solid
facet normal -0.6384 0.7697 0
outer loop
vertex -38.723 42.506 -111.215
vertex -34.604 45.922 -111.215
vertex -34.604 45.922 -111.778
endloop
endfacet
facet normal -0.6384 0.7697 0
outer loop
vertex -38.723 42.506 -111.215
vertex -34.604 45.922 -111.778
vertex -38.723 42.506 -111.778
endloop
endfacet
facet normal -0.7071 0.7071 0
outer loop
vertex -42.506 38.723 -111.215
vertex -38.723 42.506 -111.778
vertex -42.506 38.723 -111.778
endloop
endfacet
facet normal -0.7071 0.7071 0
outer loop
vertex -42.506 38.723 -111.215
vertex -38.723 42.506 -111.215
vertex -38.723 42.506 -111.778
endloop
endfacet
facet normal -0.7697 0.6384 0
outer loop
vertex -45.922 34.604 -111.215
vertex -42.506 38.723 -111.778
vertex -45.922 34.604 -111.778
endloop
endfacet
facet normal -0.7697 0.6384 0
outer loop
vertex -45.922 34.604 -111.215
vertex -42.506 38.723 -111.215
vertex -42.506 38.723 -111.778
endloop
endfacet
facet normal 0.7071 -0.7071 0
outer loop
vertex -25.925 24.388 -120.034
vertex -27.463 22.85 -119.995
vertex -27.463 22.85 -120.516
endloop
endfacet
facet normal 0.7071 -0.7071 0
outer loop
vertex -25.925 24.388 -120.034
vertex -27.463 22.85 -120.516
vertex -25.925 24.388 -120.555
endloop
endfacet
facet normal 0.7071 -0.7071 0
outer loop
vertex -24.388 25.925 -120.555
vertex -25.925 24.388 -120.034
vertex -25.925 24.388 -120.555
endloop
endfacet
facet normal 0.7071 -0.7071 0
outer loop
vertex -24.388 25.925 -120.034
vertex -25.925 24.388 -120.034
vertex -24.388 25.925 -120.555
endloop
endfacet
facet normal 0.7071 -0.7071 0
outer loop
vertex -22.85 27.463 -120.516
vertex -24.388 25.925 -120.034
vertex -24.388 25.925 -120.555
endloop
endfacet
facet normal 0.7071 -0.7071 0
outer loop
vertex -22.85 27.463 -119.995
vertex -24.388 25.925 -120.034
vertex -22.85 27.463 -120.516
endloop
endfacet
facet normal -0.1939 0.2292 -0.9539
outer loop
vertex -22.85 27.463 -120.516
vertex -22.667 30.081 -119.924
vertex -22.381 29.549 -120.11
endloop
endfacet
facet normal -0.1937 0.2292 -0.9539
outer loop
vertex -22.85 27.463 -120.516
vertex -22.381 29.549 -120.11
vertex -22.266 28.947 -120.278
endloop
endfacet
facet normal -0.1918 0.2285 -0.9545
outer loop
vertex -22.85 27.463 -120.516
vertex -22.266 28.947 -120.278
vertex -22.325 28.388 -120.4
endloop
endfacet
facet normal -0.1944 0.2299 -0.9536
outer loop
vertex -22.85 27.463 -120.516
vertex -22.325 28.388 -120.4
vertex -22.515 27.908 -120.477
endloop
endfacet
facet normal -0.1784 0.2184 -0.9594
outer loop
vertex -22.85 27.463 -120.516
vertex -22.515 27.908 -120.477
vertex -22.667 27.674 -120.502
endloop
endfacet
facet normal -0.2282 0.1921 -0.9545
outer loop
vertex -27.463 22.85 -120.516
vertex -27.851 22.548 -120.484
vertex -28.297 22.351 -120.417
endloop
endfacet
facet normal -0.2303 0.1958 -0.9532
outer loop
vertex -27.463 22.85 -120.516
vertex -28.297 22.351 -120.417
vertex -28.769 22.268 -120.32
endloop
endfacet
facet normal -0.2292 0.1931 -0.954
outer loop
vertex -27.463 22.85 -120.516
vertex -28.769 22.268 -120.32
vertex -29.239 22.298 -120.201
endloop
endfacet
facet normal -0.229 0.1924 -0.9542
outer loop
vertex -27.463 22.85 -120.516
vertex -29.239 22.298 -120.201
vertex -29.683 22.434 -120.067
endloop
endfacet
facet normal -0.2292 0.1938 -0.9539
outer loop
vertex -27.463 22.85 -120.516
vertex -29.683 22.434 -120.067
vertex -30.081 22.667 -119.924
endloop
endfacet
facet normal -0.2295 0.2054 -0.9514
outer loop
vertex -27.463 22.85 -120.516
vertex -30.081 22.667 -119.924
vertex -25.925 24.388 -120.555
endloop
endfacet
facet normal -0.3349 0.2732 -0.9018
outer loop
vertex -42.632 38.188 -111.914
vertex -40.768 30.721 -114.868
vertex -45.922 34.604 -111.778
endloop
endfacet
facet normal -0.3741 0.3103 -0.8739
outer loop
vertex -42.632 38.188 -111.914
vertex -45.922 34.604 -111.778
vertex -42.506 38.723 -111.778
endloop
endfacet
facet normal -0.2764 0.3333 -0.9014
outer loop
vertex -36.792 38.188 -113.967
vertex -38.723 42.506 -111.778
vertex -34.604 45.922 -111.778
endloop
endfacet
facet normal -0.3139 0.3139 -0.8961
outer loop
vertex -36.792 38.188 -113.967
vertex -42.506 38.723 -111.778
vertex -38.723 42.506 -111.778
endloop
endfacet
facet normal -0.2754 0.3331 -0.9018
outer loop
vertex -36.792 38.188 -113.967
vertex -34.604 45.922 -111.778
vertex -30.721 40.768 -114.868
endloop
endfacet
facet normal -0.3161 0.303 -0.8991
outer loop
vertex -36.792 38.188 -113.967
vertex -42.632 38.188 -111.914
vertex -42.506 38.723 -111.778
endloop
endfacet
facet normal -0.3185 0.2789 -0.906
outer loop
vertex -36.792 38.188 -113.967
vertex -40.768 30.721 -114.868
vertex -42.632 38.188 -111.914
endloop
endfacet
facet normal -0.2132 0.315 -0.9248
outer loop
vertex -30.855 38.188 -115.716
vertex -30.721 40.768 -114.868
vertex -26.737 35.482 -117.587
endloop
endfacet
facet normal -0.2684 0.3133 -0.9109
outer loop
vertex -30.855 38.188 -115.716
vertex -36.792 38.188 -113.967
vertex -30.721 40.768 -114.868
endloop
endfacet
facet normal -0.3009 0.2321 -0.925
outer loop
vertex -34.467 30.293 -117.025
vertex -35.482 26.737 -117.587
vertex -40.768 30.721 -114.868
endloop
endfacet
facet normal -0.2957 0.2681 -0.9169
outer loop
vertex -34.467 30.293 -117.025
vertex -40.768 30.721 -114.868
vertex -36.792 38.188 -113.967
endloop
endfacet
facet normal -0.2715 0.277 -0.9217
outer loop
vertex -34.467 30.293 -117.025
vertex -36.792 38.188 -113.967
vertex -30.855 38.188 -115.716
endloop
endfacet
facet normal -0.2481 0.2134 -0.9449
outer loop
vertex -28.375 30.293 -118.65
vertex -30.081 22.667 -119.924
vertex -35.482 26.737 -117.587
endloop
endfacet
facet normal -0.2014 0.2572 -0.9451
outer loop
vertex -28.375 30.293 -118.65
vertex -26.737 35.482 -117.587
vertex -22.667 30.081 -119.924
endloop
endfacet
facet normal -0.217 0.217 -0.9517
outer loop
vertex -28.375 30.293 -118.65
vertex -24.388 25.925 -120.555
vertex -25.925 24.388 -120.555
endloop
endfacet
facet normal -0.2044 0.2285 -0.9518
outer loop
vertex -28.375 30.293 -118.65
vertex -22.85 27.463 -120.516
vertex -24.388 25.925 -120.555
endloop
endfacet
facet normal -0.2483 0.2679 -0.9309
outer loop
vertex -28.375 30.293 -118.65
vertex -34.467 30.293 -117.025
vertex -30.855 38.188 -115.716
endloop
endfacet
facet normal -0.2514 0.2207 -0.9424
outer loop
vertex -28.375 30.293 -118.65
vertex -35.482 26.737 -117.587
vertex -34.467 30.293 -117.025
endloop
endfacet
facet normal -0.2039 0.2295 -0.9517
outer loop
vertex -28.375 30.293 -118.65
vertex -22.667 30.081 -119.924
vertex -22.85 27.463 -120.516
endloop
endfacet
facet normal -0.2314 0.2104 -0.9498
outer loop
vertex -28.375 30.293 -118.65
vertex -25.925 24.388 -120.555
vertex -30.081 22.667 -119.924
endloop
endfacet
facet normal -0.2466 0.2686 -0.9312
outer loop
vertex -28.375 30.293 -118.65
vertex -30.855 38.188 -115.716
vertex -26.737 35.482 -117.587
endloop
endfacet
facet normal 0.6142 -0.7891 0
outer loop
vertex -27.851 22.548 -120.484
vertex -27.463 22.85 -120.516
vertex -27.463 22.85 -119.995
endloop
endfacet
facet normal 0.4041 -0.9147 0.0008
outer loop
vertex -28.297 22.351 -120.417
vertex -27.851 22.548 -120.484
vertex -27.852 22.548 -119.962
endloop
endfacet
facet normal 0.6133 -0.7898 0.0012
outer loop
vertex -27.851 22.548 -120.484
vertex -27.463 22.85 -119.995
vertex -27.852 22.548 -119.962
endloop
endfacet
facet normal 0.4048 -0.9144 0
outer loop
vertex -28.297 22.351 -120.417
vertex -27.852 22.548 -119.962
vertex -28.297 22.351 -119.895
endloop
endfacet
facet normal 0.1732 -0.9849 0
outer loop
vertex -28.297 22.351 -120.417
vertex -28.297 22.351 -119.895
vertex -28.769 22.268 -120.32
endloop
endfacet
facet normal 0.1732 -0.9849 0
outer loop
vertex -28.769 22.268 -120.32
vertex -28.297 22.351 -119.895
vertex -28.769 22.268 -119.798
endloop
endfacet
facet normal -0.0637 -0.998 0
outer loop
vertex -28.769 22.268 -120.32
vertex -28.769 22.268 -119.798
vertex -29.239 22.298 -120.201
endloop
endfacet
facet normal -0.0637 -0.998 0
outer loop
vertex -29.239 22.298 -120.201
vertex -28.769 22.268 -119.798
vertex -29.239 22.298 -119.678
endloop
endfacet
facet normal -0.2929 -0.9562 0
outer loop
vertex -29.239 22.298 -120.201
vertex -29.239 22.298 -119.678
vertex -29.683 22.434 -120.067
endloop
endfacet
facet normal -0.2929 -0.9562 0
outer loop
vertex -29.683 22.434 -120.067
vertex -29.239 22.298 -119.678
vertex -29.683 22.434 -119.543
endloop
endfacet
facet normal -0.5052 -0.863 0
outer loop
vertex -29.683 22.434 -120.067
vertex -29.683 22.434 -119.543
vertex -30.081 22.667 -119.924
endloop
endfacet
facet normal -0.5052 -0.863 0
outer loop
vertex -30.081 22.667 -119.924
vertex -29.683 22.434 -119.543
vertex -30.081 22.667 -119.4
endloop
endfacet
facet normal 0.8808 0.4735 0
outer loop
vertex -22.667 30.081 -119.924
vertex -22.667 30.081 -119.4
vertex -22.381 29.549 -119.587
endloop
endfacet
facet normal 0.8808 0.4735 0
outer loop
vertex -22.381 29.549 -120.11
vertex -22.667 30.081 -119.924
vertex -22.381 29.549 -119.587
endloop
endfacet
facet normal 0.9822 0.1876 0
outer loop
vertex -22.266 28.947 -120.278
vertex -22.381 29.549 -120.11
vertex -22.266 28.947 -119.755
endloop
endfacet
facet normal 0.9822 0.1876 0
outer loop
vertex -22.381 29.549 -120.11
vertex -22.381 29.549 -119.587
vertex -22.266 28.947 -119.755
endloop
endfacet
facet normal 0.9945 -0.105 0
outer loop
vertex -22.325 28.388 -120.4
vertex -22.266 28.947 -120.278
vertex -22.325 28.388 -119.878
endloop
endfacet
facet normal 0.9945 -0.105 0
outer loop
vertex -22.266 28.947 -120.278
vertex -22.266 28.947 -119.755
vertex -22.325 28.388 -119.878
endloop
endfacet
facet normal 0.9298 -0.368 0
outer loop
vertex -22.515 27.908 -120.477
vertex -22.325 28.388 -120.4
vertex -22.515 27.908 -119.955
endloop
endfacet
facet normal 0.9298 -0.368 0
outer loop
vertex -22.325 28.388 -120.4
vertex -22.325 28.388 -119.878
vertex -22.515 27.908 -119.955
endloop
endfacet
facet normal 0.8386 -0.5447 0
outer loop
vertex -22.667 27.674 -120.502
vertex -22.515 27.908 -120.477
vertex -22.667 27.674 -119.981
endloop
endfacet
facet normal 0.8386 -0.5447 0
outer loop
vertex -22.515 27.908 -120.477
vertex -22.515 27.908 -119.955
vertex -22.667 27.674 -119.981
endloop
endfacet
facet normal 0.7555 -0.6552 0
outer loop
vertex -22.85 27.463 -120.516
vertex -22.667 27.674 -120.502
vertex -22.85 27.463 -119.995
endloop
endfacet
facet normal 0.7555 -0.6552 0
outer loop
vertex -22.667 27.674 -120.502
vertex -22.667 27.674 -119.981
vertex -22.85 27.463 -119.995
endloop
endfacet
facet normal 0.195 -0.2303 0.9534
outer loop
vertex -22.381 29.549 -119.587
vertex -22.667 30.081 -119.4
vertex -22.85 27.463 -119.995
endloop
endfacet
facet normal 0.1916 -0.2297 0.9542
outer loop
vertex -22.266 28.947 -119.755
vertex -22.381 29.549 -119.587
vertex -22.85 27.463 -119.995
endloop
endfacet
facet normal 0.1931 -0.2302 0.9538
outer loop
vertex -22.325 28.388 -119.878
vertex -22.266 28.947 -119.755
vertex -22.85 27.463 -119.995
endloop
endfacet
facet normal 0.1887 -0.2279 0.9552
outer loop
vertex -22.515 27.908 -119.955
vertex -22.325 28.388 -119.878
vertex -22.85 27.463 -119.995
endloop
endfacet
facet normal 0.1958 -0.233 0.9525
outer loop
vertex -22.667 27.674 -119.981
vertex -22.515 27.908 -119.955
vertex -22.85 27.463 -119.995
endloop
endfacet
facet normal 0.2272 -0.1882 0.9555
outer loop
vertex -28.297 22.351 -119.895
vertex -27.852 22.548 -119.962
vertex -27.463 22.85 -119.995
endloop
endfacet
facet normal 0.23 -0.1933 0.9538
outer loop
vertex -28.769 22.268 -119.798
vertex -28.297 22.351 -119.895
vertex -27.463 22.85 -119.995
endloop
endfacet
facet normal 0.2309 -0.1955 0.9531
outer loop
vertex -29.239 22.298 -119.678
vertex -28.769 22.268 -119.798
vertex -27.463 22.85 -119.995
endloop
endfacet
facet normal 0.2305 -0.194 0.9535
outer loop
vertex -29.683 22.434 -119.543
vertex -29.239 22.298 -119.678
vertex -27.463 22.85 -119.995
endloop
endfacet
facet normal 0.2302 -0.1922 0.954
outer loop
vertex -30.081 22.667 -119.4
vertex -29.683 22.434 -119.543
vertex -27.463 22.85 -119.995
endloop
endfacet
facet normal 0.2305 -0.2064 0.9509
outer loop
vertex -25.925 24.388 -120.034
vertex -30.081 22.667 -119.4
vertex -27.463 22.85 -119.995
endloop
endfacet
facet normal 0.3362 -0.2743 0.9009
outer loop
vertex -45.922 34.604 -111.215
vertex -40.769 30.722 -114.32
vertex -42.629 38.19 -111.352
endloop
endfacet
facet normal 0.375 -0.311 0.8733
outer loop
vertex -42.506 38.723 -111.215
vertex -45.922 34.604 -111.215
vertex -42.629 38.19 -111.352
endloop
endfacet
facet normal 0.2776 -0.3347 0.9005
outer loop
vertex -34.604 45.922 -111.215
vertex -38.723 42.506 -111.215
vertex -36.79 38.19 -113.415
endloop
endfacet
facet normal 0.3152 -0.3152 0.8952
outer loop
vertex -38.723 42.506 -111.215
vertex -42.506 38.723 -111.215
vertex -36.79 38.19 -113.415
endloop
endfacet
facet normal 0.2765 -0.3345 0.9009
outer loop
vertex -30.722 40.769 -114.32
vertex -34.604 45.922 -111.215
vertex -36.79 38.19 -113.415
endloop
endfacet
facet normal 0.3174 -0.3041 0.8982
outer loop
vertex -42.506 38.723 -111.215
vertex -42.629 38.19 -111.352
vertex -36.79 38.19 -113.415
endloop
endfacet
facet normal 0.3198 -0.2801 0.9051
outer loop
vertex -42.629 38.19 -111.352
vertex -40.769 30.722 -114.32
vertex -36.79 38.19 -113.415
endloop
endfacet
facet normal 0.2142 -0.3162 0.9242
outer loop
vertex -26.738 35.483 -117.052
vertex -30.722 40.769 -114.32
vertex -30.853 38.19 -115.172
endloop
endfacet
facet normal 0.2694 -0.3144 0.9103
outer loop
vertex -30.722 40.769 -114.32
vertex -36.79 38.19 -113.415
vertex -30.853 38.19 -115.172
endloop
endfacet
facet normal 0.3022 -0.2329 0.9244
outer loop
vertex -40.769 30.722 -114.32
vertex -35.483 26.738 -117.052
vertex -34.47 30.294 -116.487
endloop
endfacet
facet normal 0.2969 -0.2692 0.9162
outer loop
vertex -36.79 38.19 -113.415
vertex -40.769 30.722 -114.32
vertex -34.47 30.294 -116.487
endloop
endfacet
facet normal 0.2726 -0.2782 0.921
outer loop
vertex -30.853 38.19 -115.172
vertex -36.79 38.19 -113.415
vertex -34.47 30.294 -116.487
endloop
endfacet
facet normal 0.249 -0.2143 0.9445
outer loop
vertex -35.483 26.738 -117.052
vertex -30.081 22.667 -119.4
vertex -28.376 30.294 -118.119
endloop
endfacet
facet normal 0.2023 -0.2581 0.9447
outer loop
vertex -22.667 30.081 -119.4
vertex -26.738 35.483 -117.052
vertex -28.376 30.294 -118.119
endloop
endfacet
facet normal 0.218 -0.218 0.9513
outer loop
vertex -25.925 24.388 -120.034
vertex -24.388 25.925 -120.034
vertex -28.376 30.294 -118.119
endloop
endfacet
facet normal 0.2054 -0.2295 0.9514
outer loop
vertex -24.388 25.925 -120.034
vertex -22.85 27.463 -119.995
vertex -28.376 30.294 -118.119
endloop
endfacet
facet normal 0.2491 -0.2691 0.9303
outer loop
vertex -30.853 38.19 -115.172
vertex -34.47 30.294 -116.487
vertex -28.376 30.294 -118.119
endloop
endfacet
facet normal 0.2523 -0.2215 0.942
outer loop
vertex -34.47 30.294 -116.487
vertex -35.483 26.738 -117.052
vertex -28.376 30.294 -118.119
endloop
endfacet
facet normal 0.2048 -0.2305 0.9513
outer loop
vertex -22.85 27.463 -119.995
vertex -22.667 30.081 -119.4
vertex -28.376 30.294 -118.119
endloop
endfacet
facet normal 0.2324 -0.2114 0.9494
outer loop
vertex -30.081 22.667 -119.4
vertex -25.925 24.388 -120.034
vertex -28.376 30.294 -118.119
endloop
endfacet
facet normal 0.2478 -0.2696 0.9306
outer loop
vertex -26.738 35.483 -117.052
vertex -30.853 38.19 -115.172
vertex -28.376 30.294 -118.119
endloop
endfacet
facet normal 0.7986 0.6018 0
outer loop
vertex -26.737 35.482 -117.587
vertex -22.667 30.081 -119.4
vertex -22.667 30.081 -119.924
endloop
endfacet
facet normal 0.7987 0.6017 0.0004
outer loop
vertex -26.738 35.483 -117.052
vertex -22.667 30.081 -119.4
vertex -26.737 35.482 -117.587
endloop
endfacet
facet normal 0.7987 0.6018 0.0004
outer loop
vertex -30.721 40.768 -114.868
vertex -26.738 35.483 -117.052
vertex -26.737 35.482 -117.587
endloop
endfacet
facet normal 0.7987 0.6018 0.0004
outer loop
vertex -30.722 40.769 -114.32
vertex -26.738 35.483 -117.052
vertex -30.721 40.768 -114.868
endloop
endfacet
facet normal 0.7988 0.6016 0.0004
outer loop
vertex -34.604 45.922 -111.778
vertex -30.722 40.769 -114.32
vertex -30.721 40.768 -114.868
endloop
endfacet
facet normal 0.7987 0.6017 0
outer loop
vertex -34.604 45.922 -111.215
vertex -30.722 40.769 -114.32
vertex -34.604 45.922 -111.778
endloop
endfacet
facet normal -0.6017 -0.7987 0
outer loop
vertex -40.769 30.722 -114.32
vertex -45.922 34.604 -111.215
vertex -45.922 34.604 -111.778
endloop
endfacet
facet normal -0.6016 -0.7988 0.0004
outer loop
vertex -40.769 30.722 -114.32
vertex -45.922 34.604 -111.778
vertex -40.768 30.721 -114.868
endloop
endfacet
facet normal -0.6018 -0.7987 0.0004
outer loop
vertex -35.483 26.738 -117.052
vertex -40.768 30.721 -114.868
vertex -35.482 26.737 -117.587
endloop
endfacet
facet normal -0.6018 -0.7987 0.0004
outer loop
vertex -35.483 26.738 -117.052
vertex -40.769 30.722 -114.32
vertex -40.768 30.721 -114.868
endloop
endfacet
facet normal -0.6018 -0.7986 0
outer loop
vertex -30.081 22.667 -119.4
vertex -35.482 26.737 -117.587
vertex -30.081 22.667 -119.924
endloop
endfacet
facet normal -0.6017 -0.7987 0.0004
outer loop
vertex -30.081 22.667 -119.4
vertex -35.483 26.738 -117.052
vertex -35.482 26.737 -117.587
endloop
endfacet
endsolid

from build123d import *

# Parameters (mm, degrees)
REVOLVE_1_ANGLE     = 180
SHELL_1_T           = 0.5
SKETCH_1_OUTSIDE_W  = 328.82
SKETCH_1_OUTSIDE_H  = 328.82
CUT_EXTRUDE_1_DEPTH = 323
FILLET_1_R          = 2


with BuildPart() as part:
    # 草图2 → 旋转1 (revolve)
    with BuildSketch(Plane.XY):
        with BuildLine():
            Line((0, -125.2), (0, 125.2))
            ThreePointArc((0, 125.2), (-125.2, 0), (0, -125.2))
        make_face()
    revolve(axis=Axis((0, 151.670850912, 0), (0, -1, 0)), revolution_arc=REVOLVE_1_ANGLE)

    # 抽壳1
    shell_1_openings = [part.faces().sort_by_distance(p)[0] for p in [
        (0, 0, 0),
    ]]
    offset(amount=SHELL_1_T, openings=shell_1_openings)

    # 草图1 outside → 切除-拉伸1 (cut)
    with BuildSketch(Plane.XY):
        Rectangle(SKETCH_1_OUTSIDE_W, SKETCH_1_OUTSIDE_H)
        with BuildLine():
            Line((-45.921541828, 34.604363831), (-28.692164813, 21.621097001))
            Line((-28.692164813, 21.621097001), (-21.621097001, 28.692164813))
            Line((-21.621097001, 28.692164813), (-34.604363831, 45.921541828))
            ThreePointArc((-34.604363831, 45.921541828), (-40.658639918, 40.658639918), (-45.921541828, 34.604363831))
        make_face(mode=Mode.SUBTRACT)
    extrude(amount=-CUT_EXTRUDE_1_DEPTH, mode=Mode.SUBTRACT)

    # 圆角1
    # the kernel refuses this fillet: 2 mm, written as the material it takes off along each edge
    with BuildSketch(Plane(origin=(-21.621097001, 28.692164813, -115.588247879), x_dir=(-0.7071067811865281, -0.707106781186567, 0), z_dir=(0, 0, -1)), Plane(origin=(-28.692164813, 21.621097001, -115.588247879), x_dir=(-0.7986355100472948, 0.6018150231520455, 0), z_dir=(0, 0, -1))) as fillet_1_piece_1:
        with BuildLine():
            CenterArc((FILLET_1_R * 0.869286737816, FILLET_1_R), FILLET_1_R, 188, 82)
            Line((-FILLET_1_R * 0.120981330925, FILLET_1_R * 0.86082689904), (0, 0))
            Line((0, 0), (FILLET_1_R * 0.869286737816, 0))
        make_face()
    extrude(amount=9.214725038, mode=Mode.SUBTRACT)


solid = part.part
